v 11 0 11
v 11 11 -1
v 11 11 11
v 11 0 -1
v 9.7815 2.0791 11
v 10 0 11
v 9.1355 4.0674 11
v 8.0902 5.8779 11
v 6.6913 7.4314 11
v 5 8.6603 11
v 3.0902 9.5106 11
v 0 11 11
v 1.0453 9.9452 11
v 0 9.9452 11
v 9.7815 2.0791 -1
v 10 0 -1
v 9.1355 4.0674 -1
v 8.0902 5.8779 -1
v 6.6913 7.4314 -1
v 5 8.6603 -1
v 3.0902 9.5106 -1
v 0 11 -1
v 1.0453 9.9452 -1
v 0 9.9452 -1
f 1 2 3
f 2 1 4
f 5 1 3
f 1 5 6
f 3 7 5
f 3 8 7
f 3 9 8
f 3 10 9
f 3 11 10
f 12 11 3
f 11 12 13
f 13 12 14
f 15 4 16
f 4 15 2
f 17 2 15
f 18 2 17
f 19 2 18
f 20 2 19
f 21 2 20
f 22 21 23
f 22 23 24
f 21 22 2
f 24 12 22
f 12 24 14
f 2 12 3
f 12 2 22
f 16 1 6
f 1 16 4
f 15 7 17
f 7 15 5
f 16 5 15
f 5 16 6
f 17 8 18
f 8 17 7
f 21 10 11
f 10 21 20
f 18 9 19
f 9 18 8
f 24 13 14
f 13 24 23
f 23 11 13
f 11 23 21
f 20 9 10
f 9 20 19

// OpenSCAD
/*
 *    OpenScad functions to chamfer
 *
 *    Copyright (C) 2016 Felipe Machado
 *    Universidad Rey Juan Carlos, Spain
 *    https://github.com/felipe-m
 *    License: LGPL 3.0 or later
 *
 *    to use this functions include in your file:
 * use <chamfer.scad>
 *    if not in the same directory:
 * use <PATH_TO/chamfer.scad>
 *    dont use 'include' instead of 'use' so you dont get the objects
 *    created in this file
*/


r_fillet = 10;
h_fillet = 10;

// redondeo: to make differences, so it has to be larger

module redondeo (r_fillet, h_fillet)
{  
  difference ()
  {
   // el -1, -2 y 2, 4 es para la diferencia interna, y luego para quitar cuando se haga el chaflan
  translate([0,0,-1])cube([r_fillet+1,r_fillet+1,h_fillet+2]);
  translate([0,0,-2])cylinder(r=r_fillet, h=h_fillet+4);
  //translate([0,0,-2])cylinder(r=r_fillet, h=h_fillet+4, $fa=1, $fs=0.5);
  }
}

redondeo (r_fillet, h_fillet);

// Chamfers an edge

module chamfer (r_fillet, h_fillet)
{  
  difference ()
  {
   // el -1, -2 y 2, 4 es para la diferencia interna, y luego para quitar cuando se haga el chaflan
  translate([0,0,-1])cube([r_fillet+1,r_fillet+1,h_fillet+2]);
  translate([0,0,-2])cylinder(r=r_fillet, h=h_fillet+4, $fn=4);
  }
}

%chamfer (r_fillet, h_fillet);


// el redondeo en la esquina frontal derecha. El origen esta para que se ponga la x e y, sin rotar
module redondeo_xy (r_fillet, h_fillet)
{
    translate ([-r_fillet, -r_fillet,0]) redondeo(r_fillet, h_fillet);
}


//redondeo_xy (r_fillet, h_fillet);

//Redondeo en la esquina frontal izquierda (x, -y)

module redondeo_xmy (r_fillet, h_fillet) 
{
    translate([-r_fillet, r_fillet,0]) rotate ([0,0,-90]) redondeo(r_fillet, h_fillet);
}

//redondeo_xmy (r_fillet, h_fillet);

// Redondeo en la esquina trasera izquierda (-x, -y) (menos X menos Y)

module redondeo_mxmy (r_fillet, h_fillet) 
{
    translate([r_fillet, r_fillet,0]) rotate ([0,0,180]) redondeo(r_fillet, h_fillet);
}

//redondeo_mxmy (r_fillet, h_fillet);


// Redondeo en la esquina trasera derecha (-x, y) (menos X Y)

module redondeo_mxy (r_fillet, h_fillet) 
{
    translate([r_fillet, -r_fillet,0]) rotate ([0,0,90]) redondeo(r_fillet, h_fillet);
}

//redondeo_mxy (r_fillet, h_fillet);

// ------------------- modulo chaflan para anadir, por lo que no hay que anadir el milimetro

//diagonal = 4;
//largo = 50;

module chaflan_hal (diagonal, largo) 
{
    difference () {
        cube ([diagonal, largo, diagonal]);
        // le pongo 2*diagonal, para no estar con cuadrados y raices
        if (diagonal < 3) {
          translate([-1,-1, diagonal+1]) rotate ([0,45,0]) cube ([4*diagonal, largo+2, 4*diagonal]);
        } else {
          translate([-1,-1, diagonal+1]) rotate ([0,45,0]) cube ([2*diagonal, largo+2, 2*diagonal]);
        }  
    }
}

//chaflan_hal(diagonal=diagonal, largo=largo);
